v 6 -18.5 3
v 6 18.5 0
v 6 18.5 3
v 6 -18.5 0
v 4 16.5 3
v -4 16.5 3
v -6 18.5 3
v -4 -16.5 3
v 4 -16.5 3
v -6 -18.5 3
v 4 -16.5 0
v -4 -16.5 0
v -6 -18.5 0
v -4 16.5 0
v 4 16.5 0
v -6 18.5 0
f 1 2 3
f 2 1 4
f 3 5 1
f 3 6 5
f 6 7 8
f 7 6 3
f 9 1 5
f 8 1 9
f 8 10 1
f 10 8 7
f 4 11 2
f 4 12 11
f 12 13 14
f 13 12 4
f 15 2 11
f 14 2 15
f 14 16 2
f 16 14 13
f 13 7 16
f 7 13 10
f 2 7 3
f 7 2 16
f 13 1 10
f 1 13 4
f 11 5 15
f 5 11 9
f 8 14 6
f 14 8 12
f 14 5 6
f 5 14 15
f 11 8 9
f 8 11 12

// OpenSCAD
$fn=50;
e=0.1;

main_circle_meas_d = 7.5;
outside_circle_meas_d = 4;
length_meas = 32;
height_meas = 2;
thickness = 2;

main_circle_r = (main_circle_meas_d + 0.5) / 2;
outside_circle_r = (outside_circle_meas_d + 0.5) / 2;

difference() {
    h1 = height_meas + 1;
    w1 = length_meas + 1 + thickness * 2;
    h2 = height_meas + 1;
    
    translate([0,0,h1/2])
        cube([main_circle_r * 2 + thickness * 2, w1, h1], center=true);

    translate([0,0,h2/2 - e])
        cube([main_circle_r * 2, length_meas + 1, h2 + 3*e], center=true);
}
